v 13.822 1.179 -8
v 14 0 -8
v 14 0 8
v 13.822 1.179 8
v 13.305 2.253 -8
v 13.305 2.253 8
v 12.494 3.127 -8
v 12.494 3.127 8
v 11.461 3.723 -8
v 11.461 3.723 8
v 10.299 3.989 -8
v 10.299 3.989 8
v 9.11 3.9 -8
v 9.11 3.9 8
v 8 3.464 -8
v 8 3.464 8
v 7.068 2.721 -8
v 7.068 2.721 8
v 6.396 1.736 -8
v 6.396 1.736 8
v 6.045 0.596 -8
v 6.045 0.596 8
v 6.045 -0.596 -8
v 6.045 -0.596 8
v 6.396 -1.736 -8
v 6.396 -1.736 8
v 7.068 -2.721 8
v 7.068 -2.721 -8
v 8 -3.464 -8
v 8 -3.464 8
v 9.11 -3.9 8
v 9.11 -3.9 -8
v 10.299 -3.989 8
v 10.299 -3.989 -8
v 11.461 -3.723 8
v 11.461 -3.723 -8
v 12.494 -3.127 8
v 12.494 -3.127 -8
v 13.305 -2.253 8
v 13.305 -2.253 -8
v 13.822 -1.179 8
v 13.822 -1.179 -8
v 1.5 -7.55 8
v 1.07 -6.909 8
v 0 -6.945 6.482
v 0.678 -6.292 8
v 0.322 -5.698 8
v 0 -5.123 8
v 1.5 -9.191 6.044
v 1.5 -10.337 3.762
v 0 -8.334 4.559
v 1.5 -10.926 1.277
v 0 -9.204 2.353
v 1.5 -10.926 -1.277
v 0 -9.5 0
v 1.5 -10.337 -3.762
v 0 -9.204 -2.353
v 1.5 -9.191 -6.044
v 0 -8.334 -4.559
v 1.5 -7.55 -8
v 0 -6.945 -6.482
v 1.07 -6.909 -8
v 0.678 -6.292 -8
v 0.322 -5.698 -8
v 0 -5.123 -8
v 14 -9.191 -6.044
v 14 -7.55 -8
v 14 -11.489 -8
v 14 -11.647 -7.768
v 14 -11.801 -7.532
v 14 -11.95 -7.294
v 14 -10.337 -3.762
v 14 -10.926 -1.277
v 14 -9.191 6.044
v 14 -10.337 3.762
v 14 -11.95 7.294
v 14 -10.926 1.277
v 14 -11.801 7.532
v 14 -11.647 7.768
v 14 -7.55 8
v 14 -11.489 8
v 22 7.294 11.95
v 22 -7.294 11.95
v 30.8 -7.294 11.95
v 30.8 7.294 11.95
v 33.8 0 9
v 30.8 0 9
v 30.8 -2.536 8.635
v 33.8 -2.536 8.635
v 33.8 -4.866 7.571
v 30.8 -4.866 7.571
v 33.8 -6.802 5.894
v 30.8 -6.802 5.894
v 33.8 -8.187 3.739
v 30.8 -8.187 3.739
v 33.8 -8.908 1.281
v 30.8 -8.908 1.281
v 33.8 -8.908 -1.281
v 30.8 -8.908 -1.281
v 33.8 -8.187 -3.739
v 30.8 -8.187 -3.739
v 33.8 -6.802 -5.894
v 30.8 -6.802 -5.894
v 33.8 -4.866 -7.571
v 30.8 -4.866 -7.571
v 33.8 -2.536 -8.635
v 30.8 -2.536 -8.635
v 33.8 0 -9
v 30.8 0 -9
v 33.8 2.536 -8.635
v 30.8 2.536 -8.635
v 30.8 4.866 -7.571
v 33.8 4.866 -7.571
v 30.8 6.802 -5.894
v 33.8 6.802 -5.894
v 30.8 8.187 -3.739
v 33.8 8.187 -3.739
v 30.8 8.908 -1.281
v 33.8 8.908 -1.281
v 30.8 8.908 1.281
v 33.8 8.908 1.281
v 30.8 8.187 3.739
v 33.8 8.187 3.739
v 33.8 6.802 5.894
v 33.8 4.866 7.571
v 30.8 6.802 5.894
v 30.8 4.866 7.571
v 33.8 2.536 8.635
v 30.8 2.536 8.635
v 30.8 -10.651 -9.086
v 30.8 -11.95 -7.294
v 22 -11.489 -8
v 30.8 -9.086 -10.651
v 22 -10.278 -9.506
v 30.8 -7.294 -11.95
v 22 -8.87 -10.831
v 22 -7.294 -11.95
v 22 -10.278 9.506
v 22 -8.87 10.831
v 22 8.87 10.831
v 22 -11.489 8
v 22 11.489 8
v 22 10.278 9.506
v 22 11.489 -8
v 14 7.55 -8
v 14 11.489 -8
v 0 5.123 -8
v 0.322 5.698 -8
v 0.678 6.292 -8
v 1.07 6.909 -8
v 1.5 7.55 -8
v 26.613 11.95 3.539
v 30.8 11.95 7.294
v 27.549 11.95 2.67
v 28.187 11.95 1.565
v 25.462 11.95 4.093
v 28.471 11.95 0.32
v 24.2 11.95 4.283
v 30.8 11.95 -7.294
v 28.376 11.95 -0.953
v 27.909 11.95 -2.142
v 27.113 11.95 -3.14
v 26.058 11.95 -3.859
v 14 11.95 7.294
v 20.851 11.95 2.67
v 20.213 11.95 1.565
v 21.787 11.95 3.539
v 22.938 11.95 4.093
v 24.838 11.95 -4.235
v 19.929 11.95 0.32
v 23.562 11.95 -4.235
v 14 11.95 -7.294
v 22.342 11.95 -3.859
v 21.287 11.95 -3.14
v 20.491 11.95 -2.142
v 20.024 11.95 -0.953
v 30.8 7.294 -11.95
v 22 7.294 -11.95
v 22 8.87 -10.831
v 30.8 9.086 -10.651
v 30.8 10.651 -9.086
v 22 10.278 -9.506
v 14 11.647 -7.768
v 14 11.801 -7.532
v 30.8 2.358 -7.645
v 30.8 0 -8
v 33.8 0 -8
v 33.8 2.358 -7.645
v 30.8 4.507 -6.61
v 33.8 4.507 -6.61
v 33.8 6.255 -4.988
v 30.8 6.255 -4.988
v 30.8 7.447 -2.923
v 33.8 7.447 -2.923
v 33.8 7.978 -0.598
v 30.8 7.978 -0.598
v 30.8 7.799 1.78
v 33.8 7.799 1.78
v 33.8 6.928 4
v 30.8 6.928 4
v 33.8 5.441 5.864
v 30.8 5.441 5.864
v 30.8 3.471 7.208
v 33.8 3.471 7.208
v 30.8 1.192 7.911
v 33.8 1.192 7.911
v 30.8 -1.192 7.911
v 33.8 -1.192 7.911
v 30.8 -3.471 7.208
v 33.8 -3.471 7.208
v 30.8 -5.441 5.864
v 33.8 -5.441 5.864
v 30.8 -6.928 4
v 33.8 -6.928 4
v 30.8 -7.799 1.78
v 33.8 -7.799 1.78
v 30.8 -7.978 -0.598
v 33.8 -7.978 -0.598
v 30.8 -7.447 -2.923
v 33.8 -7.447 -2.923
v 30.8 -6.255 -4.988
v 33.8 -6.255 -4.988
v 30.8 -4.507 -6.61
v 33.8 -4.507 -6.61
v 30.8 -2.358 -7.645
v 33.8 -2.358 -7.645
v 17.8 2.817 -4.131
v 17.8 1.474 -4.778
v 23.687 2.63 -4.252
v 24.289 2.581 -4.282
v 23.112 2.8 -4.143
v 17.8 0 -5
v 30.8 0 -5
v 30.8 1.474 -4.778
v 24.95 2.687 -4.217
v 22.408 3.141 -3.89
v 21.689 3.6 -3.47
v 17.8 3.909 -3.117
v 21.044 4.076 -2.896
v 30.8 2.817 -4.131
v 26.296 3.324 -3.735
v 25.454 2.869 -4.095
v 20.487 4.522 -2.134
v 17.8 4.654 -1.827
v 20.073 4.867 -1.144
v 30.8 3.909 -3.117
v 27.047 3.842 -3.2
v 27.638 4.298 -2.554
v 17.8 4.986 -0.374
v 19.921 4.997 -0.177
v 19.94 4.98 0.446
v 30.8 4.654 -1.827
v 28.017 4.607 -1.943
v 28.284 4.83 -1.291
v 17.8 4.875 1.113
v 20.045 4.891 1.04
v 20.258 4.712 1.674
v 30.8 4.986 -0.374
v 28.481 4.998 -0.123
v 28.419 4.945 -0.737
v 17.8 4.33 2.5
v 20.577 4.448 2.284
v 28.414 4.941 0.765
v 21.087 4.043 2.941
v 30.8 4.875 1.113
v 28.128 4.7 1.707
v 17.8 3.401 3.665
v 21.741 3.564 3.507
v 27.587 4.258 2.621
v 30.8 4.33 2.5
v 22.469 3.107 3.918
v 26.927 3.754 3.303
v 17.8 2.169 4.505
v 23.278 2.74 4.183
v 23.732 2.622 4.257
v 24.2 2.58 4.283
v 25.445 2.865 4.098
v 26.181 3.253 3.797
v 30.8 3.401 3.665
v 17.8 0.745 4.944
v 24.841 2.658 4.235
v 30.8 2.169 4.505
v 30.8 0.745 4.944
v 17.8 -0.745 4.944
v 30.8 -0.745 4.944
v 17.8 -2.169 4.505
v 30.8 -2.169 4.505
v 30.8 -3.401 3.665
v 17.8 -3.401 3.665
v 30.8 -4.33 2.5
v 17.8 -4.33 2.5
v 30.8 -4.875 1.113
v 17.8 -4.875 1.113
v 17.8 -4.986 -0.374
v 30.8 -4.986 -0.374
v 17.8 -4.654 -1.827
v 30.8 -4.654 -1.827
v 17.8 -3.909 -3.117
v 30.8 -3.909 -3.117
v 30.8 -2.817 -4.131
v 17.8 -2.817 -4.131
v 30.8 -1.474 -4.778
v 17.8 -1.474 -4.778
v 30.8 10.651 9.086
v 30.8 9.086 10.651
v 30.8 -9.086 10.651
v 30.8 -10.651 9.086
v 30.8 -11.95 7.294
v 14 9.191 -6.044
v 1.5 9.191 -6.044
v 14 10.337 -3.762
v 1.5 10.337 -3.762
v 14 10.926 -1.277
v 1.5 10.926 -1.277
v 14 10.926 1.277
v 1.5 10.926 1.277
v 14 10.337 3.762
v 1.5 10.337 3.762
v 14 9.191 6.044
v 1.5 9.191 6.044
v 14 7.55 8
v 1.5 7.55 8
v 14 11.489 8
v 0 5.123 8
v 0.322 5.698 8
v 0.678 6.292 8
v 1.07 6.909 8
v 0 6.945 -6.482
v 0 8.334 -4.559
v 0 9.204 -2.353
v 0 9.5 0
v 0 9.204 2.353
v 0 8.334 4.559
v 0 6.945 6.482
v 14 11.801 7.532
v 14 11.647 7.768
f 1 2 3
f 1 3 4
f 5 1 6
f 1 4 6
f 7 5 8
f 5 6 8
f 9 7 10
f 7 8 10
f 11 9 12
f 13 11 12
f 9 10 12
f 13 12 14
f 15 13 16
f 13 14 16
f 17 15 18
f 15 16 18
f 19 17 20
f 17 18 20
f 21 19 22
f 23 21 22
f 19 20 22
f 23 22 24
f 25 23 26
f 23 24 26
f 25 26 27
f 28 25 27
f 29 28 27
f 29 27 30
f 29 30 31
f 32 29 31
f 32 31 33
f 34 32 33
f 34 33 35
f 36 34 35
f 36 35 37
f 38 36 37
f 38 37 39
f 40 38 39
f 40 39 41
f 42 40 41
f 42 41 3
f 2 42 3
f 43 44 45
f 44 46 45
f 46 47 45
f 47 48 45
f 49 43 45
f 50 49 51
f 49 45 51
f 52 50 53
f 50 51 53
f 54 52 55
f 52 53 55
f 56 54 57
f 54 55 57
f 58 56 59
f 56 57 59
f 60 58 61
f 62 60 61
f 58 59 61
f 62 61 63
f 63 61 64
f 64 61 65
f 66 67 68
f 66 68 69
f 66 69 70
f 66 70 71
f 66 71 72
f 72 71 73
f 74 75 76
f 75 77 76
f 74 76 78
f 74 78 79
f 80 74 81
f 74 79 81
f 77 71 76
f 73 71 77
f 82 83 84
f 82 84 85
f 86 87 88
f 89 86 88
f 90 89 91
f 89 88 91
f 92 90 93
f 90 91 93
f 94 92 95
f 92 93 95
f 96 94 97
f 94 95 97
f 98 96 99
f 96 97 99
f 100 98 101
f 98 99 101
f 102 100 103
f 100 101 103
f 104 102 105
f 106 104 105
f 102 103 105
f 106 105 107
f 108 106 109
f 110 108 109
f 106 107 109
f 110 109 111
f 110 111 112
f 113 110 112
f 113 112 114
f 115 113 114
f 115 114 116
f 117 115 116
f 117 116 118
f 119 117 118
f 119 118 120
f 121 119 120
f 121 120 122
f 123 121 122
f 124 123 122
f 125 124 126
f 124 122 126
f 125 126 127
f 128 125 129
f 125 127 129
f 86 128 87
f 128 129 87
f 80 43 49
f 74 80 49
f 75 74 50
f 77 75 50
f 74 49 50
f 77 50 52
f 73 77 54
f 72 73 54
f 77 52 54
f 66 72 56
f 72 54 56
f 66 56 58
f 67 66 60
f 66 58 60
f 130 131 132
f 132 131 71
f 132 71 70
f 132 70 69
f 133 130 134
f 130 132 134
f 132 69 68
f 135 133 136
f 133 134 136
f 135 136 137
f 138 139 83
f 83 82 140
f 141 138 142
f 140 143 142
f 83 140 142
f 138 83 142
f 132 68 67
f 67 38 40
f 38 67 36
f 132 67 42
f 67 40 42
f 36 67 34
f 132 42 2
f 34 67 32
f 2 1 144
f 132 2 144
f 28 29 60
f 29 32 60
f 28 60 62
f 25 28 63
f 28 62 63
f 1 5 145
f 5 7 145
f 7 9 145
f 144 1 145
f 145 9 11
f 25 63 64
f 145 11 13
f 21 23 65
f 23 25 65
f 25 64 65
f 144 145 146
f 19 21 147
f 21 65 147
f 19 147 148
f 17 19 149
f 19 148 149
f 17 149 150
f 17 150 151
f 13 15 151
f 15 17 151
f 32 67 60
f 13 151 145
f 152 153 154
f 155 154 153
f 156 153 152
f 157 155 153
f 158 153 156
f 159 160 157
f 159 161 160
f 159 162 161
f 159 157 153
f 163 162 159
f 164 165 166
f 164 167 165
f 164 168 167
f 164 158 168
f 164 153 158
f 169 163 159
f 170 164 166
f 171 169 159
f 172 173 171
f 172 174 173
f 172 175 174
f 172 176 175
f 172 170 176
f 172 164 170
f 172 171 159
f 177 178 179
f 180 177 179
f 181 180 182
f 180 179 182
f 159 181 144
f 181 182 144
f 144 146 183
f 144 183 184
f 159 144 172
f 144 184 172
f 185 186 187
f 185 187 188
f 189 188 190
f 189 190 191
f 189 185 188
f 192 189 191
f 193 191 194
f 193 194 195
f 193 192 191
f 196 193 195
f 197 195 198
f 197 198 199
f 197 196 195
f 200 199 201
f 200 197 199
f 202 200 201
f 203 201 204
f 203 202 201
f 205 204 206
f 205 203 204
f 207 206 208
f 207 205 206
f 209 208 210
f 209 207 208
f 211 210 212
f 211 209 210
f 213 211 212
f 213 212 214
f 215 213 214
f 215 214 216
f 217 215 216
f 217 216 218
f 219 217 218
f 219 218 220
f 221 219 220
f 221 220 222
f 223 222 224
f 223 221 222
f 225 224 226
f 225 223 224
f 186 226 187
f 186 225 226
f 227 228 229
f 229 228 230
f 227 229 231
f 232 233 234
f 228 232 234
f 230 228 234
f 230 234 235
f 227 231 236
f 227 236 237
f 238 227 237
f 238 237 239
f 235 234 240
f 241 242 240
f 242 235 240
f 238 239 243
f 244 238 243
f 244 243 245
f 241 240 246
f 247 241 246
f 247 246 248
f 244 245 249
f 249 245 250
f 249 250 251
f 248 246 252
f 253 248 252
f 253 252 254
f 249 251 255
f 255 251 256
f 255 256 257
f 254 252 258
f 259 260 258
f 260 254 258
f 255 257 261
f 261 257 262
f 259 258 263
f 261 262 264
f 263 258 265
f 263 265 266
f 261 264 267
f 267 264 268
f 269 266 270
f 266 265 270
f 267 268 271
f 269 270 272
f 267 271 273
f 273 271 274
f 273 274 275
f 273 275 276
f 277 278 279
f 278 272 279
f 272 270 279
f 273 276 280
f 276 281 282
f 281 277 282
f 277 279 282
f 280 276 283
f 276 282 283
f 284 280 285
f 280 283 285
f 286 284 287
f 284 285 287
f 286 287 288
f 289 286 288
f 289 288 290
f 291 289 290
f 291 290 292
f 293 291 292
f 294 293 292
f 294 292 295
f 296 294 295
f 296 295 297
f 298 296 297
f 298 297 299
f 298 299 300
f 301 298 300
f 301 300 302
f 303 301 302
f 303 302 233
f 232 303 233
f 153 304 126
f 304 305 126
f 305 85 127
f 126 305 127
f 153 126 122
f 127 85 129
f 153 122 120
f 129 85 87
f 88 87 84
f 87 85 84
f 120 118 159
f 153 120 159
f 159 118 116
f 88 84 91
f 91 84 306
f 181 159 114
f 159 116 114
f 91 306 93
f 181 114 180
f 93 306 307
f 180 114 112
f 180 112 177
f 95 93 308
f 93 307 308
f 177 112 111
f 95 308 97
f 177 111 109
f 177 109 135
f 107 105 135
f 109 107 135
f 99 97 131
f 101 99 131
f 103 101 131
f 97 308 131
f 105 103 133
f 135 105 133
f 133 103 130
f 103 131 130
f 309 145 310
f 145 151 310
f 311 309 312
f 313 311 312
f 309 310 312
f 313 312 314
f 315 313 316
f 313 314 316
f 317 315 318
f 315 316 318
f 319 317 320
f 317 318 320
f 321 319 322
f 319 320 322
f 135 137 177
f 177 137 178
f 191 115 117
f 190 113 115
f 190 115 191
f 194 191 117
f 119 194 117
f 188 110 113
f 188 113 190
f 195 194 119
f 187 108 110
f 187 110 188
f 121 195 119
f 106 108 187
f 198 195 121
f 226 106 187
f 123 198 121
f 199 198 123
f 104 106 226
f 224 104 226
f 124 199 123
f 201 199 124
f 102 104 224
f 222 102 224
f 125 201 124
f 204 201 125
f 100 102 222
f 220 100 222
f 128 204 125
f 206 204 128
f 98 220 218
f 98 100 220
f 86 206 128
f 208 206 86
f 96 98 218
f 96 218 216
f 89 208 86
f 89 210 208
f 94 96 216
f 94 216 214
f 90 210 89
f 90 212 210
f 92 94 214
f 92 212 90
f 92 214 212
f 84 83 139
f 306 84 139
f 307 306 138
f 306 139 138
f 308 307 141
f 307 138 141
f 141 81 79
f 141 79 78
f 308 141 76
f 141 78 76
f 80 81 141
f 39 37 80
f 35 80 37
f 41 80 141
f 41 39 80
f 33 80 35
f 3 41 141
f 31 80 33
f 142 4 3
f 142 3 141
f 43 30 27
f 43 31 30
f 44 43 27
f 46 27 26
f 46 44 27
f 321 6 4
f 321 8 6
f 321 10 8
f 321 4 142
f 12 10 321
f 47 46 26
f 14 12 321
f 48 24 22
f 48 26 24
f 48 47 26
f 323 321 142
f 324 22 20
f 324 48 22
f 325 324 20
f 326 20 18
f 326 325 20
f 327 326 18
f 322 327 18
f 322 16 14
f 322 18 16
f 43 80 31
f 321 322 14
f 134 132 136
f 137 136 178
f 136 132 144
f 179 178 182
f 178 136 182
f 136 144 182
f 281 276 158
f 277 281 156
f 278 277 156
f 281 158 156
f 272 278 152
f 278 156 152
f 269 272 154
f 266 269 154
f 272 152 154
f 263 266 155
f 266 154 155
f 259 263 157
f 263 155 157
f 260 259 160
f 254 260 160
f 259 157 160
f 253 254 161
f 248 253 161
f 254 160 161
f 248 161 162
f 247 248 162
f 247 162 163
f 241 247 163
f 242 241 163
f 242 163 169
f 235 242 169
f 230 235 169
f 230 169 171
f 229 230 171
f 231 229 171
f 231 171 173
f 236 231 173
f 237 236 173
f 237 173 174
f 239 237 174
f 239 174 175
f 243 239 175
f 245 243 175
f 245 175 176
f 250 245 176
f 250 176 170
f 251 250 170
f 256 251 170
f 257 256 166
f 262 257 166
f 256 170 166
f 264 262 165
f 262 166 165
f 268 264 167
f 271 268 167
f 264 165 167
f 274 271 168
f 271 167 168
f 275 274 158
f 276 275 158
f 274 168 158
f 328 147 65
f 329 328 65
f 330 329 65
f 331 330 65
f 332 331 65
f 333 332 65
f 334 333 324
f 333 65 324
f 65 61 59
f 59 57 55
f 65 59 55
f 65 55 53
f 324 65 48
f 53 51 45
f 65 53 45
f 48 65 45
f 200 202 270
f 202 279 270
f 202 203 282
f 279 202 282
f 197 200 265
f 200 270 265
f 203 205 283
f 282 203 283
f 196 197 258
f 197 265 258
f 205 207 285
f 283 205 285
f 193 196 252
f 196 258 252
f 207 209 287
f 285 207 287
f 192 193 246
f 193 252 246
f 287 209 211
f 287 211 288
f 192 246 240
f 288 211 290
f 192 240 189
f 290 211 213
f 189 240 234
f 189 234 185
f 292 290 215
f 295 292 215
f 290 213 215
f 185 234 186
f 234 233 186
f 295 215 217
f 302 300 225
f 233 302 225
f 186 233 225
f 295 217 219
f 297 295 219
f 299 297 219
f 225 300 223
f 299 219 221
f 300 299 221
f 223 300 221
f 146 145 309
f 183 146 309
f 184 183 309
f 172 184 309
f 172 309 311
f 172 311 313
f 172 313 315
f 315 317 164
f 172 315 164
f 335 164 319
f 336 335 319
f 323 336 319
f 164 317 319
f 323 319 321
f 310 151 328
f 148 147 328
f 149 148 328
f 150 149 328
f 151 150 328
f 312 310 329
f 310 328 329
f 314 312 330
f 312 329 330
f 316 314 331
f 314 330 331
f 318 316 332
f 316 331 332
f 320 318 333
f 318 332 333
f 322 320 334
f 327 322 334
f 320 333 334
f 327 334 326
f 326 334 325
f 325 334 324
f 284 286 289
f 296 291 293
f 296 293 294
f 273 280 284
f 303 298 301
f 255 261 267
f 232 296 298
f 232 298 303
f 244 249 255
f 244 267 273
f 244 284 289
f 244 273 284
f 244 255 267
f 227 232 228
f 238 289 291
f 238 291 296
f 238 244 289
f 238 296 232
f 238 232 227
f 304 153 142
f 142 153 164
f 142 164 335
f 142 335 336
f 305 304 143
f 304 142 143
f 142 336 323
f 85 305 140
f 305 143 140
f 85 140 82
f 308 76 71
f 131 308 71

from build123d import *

# Parameters (mm, degrees)
CROQUIS2_OUTSIDE_W      = 40.034
CROQUIS2_OUTSIDE_H      = 40.034
CROQUIS2_OUTSIDE_W_2    = 23.9
CROQUIS2_OUTSIDE_H_2    = 23.9
CORTAR_EXTRUIR1_DEPTH   = 37.614751126
CROQUIS3_OUTSIDE_W      = 35.046
CROQUIS3_OUTSIDE_H      = 35.046
CROQUIS3_OUTSIDE_W_2    = 16
CROQUIS3_OUTSIDE_H_2    = 32
CORTAR_EXTRUIR2_DEPTH   = 22
CROQUIS4_R              = 9
CROQUIS4_R_2            = 8
SALIENTE_EXTRUIR1_DEPTH = 3
CROQUIS5_R              = 4
CORTAR_EXTRUIR3_DEPTH   = 42.027368914
CROQUIS8_R              = 5
CORTAR_EXTRUIR4_DEPTH   = 13
CROQUIS7_R              = 4.283
CORTAR_EXTRUIR5_DEPTH   = 13


with BuildPart() as part:
    # Croquis1 → Revolución1 (revolve)
    with BuildSketch(Plane(origin=(0, 0, 0), x_dir=(1, 0, 0), z_dir=(0, 1, 0)), mode=Mode.PRIVATE) as revoluci_n1_sk:
        Polygon((0, 0), (30.8, 0), (30.8, 14), (14, 14), (14, 11), (1.5, 11), (0, 9.5), align=None)
    revolve(revoluci_n1_sk.sketch.rotate(Axis((0, 0, 0), (1, 0, 0)), 180), axis=Axis((0, 0, 0), (1, 0, 0)))

    # Croquis2 outside → Cortar-Extruir1 (cut, through all)
    with BuildSketch(Plane(origin=(0, 0, 0), x_dir=(0, 0, -1), z_dir=(1, 0, 0))):
        Rectangle(CROQUIS2_OUTSIDE_W, CROQUIS2_OUTSIDE_H)
        Rectangle(CROQUIS2_OUTSIDE_W_2, CROQUIS2_OUTSIDE_H_2, mode=Mode.SUBTRACT)
    extrude(amount=CORTAR_EXTRUIR1_DEPTH, mode=Mode.SUBTRACT)

    # Croquis3 outside → Cortar-Extruir2 (cut)
    with BuildSketch(Plane(origin=(0, 0, 0), x_dir=(0, 0, -1), z_dir=(1, 0, 0))):
        Rectangle(CROQUIS3_OUTSIDE_W, CROQUIS3_OUTSIDE_H)
        Rectangle(CROQUIS3_OUTSIDE_W_2, CROQUIS3_OUTSIDE_H_2, mode=Mode.SUBTRACT)
    extrude(amount=CORTAR_EXTRUIR2_DEPTH, mode=Mode.SUBTRACT)

    # Croquis4 → Saliente-Extruir1 (add)
    with BuildSketch(Plane(origin=(30.8, 0, 0), x_dir=(0, 0, -1), z_dir=(1, 0, 0))):
        with Locations(Location((0, 0, 0), (0, 0, 180))):
            Circle(CROQUIS4_R)
        Circle(CROQUIS4_R_2, mode=Mode.SUBTRACT)
    extrude(amount=SALIENTE_EXTRUIR1_DEPTH)

    # Croquis5 → Cortar-Extruir3 (cut, through all)
    with BuildSketch(Plane.XY.offset(8)):
        with Locations((10, 0)):
            Circle(CROQUIS5_R)
    extrude(amount=-CORTAR_EXTRUIR3_DEPTH, mode=Mode.SUBTRACT)

    # Croquis8 → Cortar-Extruir4 (cut)
    with BuildSketch(Plane(origin=(30.8, 0, 0), x_dir=(0, 0, -1), z_dir=(1, 0, 0))):
        Circle(CROQUIS8_R)
    extrude(amount=-CORTAR_EXTRUIR4_DEPTH, mode=Mode.SUBTRACT)

    # Croquis7 → Cortar-Extruir5 (cut)
    with BuildSketch(Plane(origin=(0, 11.95, 0), x_dir=(1, 0, 0), z_dir=(0, 1, 0))):
        with Locations(Location((24.2, 0, 0), (0, 0, 270))):
            Circle(CROQUIS7_R)
    extrude(amount=-CORTAR_EXTRUIR5_DEPTH, mode=Mode.SUBTRACT)


solid = part.part
